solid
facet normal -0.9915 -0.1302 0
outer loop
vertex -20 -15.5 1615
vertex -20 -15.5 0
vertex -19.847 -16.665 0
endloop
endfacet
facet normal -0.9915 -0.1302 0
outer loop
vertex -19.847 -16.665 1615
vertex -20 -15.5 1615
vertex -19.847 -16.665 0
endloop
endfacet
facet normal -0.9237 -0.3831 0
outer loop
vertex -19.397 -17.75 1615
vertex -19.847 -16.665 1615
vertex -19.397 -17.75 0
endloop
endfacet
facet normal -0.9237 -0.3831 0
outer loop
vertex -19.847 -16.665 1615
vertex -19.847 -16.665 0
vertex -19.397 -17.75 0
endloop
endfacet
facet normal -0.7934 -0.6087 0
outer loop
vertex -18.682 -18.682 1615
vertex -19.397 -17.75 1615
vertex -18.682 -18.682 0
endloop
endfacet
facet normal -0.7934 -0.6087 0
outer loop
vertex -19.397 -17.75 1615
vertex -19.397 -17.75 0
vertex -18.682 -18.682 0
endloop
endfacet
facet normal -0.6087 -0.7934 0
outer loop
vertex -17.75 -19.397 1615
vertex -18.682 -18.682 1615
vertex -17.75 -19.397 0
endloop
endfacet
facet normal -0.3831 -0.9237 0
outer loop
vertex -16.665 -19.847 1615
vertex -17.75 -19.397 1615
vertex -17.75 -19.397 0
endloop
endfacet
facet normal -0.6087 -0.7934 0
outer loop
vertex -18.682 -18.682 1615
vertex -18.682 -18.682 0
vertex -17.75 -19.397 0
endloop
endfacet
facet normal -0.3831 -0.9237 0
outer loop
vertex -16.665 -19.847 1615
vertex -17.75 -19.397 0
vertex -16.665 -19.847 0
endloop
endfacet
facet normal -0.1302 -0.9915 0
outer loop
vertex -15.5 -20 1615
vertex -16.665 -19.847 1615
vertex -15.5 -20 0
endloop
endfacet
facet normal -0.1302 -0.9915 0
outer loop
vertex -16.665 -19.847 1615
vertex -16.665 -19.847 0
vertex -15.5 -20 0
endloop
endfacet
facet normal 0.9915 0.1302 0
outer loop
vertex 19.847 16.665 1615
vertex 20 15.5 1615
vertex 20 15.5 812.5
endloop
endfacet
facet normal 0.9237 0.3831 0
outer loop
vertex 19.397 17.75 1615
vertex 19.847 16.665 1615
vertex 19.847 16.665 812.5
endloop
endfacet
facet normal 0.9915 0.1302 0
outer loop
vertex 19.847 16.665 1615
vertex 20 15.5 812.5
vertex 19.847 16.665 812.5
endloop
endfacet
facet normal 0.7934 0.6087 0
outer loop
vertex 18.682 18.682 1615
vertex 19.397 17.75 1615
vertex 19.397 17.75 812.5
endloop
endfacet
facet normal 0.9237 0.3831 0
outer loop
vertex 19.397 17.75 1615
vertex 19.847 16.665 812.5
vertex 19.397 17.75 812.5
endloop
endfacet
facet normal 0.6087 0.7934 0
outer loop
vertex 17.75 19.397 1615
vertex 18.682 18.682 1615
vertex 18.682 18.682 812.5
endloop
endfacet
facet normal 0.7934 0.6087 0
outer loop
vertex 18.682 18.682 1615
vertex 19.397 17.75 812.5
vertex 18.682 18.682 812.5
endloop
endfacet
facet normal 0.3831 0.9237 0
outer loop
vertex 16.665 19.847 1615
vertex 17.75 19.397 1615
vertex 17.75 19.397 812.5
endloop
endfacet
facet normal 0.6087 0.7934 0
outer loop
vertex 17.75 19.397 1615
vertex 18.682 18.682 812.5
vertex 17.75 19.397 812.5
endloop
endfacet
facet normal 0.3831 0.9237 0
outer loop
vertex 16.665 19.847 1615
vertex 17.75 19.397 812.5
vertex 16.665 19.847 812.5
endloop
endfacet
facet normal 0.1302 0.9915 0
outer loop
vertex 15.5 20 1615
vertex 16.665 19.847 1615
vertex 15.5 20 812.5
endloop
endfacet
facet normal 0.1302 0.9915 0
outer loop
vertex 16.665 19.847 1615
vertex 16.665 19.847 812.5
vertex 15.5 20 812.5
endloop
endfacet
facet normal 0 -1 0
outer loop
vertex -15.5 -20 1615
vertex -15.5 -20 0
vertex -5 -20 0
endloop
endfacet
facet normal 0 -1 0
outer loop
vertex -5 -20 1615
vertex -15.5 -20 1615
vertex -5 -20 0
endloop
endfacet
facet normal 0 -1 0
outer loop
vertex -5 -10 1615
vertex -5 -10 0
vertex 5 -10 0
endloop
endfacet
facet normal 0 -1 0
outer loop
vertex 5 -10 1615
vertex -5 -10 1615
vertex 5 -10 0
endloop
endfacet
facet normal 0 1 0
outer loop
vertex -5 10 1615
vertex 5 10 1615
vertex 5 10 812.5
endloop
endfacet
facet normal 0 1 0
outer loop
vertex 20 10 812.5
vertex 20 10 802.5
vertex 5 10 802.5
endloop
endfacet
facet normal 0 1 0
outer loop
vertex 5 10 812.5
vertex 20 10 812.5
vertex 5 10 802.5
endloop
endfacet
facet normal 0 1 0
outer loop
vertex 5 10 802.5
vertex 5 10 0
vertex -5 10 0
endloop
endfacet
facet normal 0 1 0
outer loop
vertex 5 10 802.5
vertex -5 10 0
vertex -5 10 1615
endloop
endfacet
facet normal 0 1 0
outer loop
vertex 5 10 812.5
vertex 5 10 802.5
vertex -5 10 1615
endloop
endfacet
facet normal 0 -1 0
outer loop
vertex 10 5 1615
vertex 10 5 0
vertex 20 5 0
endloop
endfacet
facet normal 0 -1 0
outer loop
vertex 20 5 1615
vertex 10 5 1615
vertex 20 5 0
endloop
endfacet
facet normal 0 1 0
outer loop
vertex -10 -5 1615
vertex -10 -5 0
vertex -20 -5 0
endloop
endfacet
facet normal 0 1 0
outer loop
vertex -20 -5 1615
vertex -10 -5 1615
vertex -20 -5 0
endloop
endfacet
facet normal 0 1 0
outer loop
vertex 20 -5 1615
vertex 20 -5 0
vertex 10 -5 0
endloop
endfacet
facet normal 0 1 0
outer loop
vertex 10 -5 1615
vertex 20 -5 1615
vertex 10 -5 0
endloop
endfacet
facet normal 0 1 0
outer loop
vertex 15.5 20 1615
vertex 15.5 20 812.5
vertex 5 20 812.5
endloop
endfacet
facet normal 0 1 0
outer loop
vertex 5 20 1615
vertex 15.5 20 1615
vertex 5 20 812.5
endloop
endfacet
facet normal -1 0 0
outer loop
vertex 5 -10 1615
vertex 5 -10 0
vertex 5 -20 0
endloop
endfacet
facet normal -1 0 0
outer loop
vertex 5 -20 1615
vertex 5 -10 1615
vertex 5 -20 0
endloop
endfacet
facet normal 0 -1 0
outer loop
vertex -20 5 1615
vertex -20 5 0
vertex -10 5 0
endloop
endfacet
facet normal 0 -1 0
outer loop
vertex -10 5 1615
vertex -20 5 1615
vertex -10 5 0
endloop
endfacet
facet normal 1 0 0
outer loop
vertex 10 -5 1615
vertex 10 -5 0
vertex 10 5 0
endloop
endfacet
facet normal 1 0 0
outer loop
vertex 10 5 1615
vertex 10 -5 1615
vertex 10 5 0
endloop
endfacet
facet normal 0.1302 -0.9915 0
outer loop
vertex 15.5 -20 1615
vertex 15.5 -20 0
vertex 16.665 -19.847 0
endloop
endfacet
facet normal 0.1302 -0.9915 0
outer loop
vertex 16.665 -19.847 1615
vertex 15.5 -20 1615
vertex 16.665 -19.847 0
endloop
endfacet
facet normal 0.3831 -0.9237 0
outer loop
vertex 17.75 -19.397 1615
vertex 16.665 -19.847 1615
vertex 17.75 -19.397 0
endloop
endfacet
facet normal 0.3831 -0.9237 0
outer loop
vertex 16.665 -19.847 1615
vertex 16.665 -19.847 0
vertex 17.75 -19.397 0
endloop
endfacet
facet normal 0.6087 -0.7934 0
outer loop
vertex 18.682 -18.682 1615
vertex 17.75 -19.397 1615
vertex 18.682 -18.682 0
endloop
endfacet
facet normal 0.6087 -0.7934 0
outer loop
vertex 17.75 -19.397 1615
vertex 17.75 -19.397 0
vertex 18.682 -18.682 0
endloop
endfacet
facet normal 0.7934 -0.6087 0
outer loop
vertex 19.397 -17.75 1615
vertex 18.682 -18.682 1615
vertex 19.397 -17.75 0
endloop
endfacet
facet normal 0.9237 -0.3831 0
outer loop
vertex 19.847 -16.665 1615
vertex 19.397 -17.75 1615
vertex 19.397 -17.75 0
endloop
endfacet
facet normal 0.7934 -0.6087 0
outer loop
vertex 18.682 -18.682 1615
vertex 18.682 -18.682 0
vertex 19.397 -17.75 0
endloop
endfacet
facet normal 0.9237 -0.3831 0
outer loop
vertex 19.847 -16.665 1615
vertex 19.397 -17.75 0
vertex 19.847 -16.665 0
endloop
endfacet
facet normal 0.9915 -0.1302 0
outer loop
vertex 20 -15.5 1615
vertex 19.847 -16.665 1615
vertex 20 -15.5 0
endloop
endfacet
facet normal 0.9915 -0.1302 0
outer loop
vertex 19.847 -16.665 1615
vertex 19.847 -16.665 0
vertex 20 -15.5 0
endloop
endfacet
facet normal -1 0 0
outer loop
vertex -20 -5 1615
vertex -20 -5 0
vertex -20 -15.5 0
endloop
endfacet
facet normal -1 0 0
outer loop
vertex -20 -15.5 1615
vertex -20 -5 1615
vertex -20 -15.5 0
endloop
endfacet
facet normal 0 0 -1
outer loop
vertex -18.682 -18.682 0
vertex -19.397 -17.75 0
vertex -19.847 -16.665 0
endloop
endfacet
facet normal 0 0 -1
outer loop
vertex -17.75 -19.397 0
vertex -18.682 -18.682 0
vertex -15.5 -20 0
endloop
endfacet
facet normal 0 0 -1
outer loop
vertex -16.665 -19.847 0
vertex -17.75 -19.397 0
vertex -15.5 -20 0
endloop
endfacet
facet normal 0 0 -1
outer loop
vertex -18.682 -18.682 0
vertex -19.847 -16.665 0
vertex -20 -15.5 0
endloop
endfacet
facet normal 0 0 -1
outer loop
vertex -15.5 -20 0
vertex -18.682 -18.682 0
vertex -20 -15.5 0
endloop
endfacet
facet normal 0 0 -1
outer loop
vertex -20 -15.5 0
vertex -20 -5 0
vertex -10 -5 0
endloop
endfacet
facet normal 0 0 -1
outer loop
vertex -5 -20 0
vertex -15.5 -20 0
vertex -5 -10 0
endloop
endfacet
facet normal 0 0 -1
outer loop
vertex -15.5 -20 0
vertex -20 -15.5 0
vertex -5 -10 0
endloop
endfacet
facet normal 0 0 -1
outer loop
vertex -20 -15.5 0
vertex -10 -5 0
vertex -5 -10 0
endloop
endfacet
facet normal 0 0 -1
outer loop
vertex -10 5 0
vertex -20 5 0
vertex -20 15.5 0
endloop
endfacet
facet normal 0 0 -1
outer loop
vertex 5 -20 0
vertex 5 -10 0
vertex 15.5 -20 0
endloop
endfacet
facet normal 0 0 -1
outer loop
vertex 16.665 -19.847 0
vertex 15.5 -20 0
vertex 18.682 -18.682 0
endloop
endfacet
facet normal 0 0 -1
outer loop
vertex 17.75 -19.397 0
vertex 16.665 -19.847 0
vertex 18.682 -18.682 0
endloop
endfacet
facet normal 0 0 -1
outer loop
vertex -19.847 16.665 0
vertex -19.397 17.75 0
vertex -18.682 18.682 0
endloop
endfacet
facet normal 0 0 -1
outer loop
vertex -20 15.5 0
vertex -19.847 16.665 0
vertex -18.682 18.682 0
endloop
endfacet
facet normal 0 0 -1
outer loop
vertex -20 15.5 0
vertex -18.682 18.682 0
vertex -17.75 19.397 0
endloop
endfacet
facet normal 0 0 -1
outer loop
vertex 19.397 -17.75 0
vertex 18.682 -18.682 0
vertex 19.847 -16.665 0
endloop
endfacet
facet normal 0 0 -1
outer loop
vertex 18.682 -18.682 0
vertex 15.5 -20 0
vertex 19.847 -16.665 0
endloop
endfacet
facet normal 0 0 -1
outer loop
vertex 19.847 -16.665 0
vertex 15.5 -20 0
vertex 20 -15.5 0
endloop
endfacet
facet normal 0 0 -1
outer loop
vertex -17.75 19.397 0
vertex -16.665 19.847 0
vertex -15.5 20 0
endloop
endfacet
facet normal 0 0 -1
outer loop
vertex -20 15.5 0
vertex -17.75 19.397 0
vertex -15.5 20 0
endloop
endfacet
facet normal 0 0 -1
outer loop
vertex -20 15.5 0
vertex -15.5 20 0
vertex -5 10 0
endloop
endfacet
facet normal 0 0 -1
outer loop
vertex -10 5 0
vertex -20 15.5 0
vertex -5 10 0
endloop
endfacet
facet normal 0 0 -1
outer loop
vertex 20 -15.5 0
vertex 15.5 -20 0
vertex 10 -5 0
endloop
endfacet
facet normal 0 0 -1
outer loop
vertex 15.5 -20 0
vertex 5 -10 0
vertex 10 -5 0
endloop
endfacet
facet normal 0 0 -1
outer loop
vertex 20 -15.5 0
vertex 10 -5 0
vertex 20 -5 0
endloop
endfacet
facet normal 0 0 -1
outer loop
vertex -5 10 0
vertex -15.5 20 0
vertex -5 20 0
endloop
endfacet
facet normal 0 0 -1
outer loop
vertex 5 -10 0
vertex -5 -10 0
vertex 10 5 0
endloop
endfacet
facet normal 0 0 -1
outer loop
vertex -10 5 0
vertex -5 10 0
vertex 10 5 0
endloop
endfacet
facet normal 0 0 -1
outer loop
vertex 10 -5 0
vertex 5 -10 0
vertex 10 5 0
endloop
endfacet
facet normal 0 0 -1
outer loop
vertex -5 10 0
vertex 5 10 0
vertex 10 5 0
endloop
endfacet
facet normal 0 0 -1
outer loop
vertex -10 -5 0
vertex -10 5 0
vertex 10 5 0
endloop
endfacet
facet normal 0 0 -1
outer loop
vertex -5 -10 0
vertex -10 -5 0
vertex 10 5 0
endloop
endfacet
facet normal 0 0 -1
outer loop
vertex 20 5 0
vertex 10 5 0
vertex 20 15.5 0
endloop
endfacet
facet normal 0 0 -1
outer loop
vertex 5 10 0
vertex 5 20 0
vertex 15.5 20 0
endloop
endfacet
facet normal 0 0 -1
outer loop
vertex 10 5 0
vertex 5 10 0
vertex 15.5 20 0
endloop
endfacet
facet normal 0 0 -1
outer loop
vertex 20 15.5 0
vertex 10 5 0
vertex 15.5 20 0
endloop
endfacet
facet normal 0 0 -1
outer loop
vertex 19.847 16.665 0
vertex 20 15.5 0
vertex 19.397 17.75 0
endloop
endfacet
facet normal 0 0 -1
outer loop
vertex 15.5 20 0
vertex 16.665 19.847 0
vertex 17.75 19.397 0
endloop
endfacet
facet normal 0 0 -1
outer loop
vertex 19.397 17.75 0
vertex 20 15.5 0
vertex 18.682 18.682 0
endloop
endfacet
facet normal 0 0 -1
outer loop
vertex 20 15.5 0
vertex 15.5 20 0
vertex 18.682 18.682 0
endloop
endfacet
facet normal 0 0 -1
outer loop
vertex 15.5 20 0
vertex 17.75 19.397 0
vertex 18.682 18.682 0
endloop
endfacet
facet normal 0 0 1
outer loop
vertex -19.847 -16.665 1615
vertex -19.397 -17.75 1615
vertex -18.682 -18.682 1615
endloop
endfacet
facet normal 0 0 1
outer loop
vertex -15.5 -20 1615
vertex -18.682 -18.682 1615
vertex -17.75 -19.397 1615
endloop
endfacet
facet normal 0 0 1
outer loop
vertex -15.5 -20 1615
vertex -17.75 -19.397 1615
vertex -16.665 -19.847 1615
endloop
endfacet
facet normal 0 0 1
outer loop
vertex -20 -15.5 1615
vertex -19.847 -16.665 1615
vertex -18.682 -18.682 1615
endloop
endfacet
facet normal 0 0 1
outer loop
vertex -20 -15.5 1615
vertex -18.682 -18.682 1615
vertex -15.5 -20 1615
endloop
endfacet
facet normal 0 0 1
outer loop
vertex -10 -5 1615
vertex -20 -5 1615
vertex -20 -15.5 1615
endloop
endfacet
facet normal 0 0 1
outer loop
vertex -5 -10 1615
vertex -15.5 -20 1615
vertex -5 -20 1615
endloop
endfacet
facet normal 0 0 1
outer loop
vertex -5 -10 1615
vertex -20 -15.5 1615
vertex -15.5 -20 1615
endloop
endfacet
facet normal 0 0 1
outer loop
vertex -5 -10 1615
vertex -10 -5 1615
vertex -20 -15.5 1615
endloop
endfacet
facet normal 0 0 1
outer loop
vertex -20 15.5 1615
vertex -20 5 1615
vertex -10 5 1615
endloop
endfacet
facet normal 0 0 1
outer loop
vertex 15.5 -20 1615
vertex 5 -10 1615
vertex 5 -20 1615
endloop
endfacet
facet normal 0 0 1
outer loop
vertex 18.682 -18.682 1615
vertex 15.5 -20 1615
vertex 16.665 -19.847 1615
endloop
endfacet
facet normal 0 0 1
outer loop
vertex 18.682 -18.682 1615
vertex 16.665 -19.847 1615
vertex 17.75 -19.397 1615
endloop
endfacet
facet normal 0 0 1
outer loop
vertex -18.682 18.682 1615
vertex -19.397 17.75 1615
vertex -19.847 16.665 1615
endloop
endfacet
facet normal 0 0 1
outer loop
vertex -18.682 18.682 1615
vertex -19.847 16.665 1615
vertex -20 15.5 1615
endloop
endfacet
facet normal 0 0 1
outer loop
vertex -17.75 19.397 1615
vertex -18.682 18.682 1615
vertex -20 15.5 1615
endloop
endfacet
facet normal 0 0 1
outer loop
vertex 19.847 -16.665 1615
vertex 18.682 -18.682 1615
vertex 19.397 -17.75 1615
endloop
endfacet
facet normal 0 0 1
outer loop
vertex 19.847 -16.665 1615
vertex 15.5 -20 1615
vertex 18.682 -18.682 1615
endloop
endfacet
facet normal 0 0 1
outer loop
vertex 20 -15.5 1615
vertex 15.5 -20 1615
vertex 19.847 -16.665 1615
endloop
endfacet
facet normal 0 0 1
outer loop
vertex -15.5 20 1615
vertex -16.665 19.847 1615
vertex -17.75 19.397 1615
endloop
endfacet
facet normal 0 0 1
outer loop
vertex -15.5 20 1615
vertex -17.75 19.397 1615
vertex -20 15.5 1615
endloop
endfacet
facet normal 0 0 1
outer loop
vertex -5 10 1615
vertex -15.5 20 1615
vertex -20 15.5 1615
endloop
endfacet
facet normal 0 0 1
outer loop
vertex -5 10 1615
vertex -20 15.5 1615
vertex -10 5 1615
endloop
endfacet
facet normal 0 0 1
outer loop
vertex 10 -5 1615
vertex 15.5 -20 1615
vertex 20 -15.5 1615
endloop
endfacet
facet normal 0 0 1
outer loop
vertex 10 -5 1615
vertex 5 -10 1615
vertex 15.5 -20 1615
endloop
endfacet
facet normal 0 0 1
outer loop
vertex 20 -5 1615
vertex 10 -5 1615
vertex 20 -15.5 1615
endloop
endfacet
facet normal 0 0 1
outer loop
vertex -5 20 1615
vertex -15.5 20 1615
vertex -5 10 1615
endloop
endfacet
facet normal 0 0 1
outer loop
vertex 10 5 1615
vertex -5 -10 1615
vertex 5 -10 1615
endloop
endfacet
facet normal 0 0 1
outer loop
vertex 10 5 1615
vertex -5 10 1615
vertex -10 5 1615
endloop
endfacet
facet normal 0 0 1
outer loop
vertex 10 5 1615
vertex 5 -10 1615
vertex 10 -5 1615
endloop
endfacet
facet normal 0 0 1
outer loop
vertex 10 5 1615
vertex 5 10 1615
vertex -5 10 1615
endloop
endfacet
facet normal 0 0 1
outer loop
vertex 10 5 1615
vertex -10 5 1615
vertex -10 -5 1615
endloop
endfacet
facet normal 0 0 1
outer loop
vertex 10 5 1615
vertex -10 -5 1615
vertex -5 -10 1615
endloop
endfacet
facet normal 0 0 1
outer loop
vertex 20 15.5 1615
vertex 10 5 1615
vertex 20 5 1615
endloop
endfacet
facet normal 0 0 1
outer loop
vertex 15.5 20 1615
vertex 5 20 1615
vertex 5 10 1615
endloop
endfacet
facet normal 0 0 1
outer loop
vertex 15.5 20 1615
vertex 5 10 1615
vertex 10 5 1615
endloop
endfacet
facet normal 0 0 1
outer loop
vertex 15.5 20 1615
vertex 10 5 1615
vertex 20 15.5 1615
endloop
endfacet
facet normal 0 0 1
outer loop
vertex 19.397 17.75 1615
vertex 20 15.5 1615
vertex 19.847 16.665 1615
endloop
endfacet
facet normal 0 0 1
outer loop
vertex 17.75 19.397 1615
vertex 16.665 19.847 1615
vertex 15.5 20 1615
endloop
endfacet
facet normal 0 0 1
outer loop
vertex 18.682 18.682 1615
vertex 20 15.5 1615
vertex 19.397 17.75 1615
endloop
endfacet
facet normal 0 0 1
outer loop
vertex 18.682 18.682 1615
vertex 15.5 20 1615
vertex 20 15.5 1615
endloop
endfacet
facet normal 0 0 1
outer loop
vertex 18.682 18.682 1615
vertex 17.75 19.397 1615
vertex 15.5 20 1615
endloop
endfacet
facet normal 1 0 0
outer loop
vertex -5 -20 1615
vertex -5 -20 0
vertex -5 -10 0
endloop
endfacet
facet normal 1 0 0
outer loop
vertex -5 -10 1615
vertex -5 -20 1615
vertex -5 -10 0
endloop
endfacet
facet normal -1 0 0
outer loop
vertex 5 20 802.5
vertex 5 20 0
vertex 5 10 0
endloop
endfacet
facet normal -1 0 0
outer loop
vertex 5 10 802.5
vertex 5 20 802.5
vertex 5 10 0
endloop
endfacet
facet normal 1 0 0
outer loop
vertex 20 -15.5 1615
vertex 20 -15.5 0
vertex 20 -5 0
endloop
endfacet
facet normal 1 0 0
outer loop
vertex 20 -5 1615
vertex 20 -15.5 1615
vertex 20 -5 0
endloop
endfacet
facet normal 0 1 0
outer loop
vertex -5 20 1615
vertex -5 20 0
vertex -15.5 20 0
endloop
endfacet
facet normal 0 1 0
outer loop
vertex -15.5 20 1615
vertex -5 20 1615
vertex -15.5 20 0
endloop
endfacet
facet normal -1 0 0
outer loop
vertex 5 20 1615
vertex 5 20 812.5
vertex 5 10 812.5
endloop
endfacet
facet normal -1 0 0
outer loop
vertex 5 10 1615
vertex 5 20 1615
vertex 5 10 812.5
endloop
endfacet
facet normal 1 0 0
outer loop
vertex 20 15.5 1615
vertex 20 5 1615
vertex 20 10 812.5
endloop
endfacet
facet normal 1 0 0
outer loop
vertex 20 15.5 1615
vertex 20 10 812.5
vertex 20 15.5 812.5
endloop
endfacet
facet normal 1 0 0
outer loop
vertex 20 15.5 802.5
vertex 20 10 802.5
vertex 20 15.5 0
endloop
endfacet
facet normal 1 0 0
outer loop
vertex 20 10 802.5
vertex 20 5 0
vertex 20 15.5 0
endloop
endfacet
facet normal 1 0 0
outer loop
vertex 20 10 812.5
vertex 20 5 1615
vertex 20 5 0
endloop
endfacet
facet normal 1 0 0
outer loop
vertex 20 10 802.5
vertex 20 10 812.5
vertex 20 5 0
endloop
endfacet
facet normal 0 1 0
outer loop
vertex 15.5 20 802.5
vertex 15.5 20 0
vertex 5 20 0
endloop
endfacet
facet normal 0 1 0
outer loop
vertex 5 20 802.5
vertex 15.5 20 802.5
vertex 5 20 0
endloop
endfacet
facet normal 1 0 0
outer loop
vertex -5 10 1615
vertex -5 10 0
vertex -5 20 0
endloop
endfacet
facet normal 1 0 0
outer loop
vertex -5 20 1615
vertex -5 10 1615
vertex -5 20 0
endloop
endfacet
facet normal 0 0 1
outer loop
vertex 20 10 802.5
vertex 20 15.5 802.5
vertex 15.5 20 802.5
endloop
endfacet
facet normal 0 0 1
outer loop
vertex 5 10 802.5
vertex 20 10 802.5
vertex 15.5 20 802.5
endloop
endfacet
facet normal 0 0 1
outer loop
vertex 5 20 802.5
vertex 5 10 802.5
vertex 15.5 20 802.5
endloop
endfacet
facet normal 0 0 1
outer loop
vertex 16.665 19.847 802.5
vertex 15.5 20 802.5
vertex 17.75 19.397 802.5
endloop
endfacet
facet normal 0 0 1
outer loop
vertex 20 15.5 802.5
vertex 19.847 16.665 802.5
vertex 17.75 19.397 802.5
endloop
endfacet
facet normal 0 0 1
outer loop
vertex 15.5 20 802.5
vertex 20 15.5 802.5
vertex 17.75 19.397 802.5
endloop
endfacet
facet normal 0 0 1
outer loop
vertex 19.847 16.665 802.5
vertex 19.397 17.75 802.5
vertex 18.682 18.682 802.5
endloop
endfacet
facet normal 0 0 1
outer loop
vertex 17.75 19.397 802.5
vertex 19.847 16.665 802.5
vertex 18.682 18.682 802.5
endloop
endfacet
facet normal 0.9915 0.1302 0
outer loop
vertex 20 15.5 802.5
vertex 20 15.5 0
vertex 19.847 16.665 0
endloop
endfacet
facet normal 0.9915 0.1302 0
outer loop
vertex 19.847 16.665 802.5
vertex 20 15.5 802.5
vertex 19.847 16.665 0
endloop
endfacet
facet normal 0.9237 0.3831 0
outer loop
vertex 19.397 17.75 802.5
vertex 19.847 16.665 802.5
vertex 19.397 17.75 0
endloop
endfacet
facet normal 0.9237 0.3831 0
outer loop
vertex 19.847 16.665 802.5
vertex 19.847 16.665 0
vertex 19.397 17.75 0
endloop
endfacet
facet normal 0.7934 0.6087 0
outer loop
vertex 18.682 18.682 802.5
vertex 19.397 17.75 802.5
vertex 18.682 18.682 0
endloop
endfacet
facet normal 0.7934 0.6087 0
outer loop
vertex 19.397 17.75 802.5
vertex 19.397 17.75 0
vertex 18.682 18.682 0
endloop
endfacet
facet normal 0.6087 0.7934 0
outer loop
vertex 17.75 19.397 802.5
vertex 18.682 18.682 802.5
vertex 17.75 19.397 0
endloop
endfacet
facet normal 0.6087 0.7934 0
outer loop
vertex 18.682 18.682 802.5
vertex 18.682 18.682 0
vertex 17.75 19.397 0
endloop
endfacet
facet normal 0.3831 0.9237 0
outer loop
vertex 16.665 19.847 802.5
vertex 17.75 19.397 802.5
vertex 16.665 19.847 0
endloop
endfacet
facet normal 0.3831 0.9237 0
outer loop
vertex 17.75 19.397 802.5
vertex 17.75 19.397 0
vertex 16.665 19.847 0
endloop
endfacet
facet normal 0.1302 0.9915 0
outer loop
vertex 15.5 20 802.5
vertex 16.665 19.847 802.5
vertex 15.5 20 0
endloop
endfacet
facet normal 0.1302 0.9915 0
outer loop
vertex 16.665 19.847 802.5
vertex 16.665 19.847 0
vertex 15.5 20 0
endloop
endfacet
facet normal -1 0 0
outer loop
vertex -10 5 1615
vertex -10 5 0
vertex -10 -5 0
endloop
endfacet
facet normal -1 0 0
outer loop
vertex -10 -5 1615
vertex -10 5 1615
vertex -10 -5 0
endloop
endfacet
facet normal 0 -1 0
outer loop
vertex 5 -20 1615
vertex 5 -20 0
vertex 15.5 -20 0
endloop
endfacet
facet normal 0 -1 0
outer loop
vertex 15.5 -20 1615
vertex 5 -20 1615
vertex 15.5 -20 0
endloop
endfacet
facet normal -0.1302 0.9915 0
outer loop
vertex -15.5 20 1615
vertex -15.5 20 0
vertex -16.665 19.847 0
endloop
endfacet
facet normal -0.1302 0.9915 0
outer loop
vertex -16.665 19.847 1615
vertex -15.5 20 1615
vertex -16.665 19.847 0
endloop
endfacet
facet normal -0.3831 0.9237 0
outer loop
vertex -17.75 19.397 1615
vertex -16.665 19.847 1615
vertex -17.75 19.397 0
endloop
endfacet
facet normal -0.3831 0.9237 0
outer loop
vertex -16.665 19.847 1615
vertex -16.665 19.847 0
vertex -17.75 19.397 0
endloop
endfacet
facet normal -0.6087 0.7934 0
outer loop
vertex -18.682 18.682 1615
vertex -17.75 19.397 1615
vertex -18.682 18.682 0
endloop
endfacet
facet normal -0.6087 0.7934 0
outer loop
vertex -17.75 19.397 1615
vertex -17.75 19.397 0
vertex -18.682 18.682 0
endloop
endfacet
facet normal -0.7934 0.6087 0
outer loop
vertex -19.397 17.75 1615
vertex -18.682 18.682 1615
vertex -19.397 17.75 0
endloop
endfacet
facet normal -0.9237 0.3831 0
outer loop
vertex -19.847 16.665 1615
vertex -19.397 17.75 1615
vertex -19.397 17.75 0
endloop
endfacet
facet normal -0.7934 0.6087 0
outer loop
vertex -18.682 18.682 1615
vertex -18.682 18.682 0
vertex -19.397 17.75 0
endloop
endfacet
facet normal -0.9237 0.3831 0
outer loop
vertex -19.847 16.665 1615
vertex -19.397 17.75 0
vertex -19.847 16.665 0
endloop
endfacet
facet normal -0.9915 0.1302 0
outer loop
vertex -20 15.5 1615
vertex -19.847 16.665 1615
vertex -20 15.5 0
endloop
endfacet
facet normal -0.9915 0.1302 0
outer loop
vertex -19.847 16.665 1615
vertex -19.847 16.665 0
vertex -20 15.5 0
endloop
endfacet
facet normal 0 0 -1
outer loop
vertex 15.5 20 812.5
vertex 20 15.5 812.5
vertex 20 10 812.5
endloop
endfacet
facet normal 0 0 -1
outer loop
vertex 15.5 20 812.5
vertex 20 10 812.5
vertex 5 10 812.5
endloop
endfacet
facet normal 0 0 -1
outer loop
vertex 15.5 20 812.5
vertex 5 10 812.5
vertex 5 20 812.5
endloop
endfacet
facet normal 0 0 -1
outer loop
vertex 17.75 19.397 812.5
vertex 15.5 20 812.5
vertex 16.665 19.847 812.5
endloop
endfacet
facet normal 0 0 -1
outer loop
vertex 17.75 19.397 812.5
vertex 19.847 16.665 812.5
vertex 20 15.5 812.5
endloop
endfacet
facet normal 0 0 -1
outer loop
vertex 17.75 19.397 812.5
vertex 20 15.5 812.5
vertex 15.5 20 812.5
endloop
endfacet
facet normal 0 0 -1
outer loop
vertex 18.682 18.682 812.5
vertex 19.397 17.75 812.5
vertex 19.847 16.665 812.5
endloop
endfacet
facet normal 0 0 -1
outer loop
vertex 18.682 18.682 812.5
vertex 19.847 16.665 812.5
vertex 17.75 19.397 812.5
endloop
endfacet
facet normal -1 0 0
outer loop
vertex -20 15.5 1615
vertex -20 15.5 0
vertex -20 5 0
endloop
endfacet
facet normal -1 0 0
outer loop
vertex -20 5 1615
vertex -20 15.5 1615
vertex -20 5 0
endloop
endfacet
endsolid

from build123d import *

# Parameters (mm, degrees)
BOSS_EXTRUDE1_DEPTH             = 1615
SCHNITT_LINEAR_AUSTRAGEN1_REACH = 1617.619
SKIZZE1_W                       = 10
SKIZZE1_H                       = 10


with BuildPart() as part:
    # Sketch1 → Boss-Extrude1 (new body)
    with BuildSketch(Plane.XY):
        with BuildLine():
            Line((-15.5, -20), (-5, -20))
            Line((-5, -20), (-5, -10))
            Line((-5, -10), (5, -10))
            Line((5, -10), (5, -20))
            Line((5, -20), (15.5, -20))
            ThreePointArc((15.5, -20), (18.681980515, -18.681980515), (20, -15.5))
            Line((20, -15.5), (20, -5))
            Line((20, -5), (10, -5))
            Line((10, -5), (10, 5))
            Line((10, 5), (20, 5))
            Line((20, 5), (20, 15.5))
            ThreePointArc((20, 15.5), (18.681980515, 18.681980515), (15.5, 20))
            Line((15.5, 20), (5, 20))
            Line((5, 20), (5, 10))
            Line((5, 10), (-5, 10))
            Line((-5, 10), (-5, 20))
            Line((-5, 20), (-8, 20))
            Line((-8, 20), (-15, 20))
            Line((-15, 20), (-15.5, 20))
            ThreePointArc((-15.5, 20), (-18.681980515, 18.681980515), (-20, 15.5))
            Line((-20, 15.5), (-20, 5))
            Line((-20, 5), (-10, 5))
            Line((-10, 5), (-10, -5))
            Line((-10, -5), (-20, -5))
            Line((-20, -5), (-20, -15.5))
            ThreePointArc((-20, -15.5), (-18.681980515, -18.681980515), (-15.5, -20))
        make_face()
    extrude(amount=BOSS_EXTRUDE1_DEPTH)

    # Skizze1 → Schnitt-Linear austragen1 (cut, up to next)
    with BuildSketch(Plane(origin=(20, 0, 0), x_dir=(0, 0, -1), z_dir=(1, 0, 0)), mode=Mode.PRIVATE) as schnitt_linear_austragen1_sk1:
        with Locations((-807.5, 15)):
            Rectangle(SKIZZE1_W, SKIZZE1_H)
    schnitt_linear_austragen1_tool1 = extrude(schnitt_linear_austragen1_sk1.sketch, amount=-SCHNITT_LINEAR_AUSTRAGEN1_REACH, mode=Mode.PRIVATE) & part.part
    add(schnitt_linear_austragen1_tool1.solids().sort_by_distance((20, 15, 807.5))[0], mode=Mode.SUBTRACT)


solid = part.part
